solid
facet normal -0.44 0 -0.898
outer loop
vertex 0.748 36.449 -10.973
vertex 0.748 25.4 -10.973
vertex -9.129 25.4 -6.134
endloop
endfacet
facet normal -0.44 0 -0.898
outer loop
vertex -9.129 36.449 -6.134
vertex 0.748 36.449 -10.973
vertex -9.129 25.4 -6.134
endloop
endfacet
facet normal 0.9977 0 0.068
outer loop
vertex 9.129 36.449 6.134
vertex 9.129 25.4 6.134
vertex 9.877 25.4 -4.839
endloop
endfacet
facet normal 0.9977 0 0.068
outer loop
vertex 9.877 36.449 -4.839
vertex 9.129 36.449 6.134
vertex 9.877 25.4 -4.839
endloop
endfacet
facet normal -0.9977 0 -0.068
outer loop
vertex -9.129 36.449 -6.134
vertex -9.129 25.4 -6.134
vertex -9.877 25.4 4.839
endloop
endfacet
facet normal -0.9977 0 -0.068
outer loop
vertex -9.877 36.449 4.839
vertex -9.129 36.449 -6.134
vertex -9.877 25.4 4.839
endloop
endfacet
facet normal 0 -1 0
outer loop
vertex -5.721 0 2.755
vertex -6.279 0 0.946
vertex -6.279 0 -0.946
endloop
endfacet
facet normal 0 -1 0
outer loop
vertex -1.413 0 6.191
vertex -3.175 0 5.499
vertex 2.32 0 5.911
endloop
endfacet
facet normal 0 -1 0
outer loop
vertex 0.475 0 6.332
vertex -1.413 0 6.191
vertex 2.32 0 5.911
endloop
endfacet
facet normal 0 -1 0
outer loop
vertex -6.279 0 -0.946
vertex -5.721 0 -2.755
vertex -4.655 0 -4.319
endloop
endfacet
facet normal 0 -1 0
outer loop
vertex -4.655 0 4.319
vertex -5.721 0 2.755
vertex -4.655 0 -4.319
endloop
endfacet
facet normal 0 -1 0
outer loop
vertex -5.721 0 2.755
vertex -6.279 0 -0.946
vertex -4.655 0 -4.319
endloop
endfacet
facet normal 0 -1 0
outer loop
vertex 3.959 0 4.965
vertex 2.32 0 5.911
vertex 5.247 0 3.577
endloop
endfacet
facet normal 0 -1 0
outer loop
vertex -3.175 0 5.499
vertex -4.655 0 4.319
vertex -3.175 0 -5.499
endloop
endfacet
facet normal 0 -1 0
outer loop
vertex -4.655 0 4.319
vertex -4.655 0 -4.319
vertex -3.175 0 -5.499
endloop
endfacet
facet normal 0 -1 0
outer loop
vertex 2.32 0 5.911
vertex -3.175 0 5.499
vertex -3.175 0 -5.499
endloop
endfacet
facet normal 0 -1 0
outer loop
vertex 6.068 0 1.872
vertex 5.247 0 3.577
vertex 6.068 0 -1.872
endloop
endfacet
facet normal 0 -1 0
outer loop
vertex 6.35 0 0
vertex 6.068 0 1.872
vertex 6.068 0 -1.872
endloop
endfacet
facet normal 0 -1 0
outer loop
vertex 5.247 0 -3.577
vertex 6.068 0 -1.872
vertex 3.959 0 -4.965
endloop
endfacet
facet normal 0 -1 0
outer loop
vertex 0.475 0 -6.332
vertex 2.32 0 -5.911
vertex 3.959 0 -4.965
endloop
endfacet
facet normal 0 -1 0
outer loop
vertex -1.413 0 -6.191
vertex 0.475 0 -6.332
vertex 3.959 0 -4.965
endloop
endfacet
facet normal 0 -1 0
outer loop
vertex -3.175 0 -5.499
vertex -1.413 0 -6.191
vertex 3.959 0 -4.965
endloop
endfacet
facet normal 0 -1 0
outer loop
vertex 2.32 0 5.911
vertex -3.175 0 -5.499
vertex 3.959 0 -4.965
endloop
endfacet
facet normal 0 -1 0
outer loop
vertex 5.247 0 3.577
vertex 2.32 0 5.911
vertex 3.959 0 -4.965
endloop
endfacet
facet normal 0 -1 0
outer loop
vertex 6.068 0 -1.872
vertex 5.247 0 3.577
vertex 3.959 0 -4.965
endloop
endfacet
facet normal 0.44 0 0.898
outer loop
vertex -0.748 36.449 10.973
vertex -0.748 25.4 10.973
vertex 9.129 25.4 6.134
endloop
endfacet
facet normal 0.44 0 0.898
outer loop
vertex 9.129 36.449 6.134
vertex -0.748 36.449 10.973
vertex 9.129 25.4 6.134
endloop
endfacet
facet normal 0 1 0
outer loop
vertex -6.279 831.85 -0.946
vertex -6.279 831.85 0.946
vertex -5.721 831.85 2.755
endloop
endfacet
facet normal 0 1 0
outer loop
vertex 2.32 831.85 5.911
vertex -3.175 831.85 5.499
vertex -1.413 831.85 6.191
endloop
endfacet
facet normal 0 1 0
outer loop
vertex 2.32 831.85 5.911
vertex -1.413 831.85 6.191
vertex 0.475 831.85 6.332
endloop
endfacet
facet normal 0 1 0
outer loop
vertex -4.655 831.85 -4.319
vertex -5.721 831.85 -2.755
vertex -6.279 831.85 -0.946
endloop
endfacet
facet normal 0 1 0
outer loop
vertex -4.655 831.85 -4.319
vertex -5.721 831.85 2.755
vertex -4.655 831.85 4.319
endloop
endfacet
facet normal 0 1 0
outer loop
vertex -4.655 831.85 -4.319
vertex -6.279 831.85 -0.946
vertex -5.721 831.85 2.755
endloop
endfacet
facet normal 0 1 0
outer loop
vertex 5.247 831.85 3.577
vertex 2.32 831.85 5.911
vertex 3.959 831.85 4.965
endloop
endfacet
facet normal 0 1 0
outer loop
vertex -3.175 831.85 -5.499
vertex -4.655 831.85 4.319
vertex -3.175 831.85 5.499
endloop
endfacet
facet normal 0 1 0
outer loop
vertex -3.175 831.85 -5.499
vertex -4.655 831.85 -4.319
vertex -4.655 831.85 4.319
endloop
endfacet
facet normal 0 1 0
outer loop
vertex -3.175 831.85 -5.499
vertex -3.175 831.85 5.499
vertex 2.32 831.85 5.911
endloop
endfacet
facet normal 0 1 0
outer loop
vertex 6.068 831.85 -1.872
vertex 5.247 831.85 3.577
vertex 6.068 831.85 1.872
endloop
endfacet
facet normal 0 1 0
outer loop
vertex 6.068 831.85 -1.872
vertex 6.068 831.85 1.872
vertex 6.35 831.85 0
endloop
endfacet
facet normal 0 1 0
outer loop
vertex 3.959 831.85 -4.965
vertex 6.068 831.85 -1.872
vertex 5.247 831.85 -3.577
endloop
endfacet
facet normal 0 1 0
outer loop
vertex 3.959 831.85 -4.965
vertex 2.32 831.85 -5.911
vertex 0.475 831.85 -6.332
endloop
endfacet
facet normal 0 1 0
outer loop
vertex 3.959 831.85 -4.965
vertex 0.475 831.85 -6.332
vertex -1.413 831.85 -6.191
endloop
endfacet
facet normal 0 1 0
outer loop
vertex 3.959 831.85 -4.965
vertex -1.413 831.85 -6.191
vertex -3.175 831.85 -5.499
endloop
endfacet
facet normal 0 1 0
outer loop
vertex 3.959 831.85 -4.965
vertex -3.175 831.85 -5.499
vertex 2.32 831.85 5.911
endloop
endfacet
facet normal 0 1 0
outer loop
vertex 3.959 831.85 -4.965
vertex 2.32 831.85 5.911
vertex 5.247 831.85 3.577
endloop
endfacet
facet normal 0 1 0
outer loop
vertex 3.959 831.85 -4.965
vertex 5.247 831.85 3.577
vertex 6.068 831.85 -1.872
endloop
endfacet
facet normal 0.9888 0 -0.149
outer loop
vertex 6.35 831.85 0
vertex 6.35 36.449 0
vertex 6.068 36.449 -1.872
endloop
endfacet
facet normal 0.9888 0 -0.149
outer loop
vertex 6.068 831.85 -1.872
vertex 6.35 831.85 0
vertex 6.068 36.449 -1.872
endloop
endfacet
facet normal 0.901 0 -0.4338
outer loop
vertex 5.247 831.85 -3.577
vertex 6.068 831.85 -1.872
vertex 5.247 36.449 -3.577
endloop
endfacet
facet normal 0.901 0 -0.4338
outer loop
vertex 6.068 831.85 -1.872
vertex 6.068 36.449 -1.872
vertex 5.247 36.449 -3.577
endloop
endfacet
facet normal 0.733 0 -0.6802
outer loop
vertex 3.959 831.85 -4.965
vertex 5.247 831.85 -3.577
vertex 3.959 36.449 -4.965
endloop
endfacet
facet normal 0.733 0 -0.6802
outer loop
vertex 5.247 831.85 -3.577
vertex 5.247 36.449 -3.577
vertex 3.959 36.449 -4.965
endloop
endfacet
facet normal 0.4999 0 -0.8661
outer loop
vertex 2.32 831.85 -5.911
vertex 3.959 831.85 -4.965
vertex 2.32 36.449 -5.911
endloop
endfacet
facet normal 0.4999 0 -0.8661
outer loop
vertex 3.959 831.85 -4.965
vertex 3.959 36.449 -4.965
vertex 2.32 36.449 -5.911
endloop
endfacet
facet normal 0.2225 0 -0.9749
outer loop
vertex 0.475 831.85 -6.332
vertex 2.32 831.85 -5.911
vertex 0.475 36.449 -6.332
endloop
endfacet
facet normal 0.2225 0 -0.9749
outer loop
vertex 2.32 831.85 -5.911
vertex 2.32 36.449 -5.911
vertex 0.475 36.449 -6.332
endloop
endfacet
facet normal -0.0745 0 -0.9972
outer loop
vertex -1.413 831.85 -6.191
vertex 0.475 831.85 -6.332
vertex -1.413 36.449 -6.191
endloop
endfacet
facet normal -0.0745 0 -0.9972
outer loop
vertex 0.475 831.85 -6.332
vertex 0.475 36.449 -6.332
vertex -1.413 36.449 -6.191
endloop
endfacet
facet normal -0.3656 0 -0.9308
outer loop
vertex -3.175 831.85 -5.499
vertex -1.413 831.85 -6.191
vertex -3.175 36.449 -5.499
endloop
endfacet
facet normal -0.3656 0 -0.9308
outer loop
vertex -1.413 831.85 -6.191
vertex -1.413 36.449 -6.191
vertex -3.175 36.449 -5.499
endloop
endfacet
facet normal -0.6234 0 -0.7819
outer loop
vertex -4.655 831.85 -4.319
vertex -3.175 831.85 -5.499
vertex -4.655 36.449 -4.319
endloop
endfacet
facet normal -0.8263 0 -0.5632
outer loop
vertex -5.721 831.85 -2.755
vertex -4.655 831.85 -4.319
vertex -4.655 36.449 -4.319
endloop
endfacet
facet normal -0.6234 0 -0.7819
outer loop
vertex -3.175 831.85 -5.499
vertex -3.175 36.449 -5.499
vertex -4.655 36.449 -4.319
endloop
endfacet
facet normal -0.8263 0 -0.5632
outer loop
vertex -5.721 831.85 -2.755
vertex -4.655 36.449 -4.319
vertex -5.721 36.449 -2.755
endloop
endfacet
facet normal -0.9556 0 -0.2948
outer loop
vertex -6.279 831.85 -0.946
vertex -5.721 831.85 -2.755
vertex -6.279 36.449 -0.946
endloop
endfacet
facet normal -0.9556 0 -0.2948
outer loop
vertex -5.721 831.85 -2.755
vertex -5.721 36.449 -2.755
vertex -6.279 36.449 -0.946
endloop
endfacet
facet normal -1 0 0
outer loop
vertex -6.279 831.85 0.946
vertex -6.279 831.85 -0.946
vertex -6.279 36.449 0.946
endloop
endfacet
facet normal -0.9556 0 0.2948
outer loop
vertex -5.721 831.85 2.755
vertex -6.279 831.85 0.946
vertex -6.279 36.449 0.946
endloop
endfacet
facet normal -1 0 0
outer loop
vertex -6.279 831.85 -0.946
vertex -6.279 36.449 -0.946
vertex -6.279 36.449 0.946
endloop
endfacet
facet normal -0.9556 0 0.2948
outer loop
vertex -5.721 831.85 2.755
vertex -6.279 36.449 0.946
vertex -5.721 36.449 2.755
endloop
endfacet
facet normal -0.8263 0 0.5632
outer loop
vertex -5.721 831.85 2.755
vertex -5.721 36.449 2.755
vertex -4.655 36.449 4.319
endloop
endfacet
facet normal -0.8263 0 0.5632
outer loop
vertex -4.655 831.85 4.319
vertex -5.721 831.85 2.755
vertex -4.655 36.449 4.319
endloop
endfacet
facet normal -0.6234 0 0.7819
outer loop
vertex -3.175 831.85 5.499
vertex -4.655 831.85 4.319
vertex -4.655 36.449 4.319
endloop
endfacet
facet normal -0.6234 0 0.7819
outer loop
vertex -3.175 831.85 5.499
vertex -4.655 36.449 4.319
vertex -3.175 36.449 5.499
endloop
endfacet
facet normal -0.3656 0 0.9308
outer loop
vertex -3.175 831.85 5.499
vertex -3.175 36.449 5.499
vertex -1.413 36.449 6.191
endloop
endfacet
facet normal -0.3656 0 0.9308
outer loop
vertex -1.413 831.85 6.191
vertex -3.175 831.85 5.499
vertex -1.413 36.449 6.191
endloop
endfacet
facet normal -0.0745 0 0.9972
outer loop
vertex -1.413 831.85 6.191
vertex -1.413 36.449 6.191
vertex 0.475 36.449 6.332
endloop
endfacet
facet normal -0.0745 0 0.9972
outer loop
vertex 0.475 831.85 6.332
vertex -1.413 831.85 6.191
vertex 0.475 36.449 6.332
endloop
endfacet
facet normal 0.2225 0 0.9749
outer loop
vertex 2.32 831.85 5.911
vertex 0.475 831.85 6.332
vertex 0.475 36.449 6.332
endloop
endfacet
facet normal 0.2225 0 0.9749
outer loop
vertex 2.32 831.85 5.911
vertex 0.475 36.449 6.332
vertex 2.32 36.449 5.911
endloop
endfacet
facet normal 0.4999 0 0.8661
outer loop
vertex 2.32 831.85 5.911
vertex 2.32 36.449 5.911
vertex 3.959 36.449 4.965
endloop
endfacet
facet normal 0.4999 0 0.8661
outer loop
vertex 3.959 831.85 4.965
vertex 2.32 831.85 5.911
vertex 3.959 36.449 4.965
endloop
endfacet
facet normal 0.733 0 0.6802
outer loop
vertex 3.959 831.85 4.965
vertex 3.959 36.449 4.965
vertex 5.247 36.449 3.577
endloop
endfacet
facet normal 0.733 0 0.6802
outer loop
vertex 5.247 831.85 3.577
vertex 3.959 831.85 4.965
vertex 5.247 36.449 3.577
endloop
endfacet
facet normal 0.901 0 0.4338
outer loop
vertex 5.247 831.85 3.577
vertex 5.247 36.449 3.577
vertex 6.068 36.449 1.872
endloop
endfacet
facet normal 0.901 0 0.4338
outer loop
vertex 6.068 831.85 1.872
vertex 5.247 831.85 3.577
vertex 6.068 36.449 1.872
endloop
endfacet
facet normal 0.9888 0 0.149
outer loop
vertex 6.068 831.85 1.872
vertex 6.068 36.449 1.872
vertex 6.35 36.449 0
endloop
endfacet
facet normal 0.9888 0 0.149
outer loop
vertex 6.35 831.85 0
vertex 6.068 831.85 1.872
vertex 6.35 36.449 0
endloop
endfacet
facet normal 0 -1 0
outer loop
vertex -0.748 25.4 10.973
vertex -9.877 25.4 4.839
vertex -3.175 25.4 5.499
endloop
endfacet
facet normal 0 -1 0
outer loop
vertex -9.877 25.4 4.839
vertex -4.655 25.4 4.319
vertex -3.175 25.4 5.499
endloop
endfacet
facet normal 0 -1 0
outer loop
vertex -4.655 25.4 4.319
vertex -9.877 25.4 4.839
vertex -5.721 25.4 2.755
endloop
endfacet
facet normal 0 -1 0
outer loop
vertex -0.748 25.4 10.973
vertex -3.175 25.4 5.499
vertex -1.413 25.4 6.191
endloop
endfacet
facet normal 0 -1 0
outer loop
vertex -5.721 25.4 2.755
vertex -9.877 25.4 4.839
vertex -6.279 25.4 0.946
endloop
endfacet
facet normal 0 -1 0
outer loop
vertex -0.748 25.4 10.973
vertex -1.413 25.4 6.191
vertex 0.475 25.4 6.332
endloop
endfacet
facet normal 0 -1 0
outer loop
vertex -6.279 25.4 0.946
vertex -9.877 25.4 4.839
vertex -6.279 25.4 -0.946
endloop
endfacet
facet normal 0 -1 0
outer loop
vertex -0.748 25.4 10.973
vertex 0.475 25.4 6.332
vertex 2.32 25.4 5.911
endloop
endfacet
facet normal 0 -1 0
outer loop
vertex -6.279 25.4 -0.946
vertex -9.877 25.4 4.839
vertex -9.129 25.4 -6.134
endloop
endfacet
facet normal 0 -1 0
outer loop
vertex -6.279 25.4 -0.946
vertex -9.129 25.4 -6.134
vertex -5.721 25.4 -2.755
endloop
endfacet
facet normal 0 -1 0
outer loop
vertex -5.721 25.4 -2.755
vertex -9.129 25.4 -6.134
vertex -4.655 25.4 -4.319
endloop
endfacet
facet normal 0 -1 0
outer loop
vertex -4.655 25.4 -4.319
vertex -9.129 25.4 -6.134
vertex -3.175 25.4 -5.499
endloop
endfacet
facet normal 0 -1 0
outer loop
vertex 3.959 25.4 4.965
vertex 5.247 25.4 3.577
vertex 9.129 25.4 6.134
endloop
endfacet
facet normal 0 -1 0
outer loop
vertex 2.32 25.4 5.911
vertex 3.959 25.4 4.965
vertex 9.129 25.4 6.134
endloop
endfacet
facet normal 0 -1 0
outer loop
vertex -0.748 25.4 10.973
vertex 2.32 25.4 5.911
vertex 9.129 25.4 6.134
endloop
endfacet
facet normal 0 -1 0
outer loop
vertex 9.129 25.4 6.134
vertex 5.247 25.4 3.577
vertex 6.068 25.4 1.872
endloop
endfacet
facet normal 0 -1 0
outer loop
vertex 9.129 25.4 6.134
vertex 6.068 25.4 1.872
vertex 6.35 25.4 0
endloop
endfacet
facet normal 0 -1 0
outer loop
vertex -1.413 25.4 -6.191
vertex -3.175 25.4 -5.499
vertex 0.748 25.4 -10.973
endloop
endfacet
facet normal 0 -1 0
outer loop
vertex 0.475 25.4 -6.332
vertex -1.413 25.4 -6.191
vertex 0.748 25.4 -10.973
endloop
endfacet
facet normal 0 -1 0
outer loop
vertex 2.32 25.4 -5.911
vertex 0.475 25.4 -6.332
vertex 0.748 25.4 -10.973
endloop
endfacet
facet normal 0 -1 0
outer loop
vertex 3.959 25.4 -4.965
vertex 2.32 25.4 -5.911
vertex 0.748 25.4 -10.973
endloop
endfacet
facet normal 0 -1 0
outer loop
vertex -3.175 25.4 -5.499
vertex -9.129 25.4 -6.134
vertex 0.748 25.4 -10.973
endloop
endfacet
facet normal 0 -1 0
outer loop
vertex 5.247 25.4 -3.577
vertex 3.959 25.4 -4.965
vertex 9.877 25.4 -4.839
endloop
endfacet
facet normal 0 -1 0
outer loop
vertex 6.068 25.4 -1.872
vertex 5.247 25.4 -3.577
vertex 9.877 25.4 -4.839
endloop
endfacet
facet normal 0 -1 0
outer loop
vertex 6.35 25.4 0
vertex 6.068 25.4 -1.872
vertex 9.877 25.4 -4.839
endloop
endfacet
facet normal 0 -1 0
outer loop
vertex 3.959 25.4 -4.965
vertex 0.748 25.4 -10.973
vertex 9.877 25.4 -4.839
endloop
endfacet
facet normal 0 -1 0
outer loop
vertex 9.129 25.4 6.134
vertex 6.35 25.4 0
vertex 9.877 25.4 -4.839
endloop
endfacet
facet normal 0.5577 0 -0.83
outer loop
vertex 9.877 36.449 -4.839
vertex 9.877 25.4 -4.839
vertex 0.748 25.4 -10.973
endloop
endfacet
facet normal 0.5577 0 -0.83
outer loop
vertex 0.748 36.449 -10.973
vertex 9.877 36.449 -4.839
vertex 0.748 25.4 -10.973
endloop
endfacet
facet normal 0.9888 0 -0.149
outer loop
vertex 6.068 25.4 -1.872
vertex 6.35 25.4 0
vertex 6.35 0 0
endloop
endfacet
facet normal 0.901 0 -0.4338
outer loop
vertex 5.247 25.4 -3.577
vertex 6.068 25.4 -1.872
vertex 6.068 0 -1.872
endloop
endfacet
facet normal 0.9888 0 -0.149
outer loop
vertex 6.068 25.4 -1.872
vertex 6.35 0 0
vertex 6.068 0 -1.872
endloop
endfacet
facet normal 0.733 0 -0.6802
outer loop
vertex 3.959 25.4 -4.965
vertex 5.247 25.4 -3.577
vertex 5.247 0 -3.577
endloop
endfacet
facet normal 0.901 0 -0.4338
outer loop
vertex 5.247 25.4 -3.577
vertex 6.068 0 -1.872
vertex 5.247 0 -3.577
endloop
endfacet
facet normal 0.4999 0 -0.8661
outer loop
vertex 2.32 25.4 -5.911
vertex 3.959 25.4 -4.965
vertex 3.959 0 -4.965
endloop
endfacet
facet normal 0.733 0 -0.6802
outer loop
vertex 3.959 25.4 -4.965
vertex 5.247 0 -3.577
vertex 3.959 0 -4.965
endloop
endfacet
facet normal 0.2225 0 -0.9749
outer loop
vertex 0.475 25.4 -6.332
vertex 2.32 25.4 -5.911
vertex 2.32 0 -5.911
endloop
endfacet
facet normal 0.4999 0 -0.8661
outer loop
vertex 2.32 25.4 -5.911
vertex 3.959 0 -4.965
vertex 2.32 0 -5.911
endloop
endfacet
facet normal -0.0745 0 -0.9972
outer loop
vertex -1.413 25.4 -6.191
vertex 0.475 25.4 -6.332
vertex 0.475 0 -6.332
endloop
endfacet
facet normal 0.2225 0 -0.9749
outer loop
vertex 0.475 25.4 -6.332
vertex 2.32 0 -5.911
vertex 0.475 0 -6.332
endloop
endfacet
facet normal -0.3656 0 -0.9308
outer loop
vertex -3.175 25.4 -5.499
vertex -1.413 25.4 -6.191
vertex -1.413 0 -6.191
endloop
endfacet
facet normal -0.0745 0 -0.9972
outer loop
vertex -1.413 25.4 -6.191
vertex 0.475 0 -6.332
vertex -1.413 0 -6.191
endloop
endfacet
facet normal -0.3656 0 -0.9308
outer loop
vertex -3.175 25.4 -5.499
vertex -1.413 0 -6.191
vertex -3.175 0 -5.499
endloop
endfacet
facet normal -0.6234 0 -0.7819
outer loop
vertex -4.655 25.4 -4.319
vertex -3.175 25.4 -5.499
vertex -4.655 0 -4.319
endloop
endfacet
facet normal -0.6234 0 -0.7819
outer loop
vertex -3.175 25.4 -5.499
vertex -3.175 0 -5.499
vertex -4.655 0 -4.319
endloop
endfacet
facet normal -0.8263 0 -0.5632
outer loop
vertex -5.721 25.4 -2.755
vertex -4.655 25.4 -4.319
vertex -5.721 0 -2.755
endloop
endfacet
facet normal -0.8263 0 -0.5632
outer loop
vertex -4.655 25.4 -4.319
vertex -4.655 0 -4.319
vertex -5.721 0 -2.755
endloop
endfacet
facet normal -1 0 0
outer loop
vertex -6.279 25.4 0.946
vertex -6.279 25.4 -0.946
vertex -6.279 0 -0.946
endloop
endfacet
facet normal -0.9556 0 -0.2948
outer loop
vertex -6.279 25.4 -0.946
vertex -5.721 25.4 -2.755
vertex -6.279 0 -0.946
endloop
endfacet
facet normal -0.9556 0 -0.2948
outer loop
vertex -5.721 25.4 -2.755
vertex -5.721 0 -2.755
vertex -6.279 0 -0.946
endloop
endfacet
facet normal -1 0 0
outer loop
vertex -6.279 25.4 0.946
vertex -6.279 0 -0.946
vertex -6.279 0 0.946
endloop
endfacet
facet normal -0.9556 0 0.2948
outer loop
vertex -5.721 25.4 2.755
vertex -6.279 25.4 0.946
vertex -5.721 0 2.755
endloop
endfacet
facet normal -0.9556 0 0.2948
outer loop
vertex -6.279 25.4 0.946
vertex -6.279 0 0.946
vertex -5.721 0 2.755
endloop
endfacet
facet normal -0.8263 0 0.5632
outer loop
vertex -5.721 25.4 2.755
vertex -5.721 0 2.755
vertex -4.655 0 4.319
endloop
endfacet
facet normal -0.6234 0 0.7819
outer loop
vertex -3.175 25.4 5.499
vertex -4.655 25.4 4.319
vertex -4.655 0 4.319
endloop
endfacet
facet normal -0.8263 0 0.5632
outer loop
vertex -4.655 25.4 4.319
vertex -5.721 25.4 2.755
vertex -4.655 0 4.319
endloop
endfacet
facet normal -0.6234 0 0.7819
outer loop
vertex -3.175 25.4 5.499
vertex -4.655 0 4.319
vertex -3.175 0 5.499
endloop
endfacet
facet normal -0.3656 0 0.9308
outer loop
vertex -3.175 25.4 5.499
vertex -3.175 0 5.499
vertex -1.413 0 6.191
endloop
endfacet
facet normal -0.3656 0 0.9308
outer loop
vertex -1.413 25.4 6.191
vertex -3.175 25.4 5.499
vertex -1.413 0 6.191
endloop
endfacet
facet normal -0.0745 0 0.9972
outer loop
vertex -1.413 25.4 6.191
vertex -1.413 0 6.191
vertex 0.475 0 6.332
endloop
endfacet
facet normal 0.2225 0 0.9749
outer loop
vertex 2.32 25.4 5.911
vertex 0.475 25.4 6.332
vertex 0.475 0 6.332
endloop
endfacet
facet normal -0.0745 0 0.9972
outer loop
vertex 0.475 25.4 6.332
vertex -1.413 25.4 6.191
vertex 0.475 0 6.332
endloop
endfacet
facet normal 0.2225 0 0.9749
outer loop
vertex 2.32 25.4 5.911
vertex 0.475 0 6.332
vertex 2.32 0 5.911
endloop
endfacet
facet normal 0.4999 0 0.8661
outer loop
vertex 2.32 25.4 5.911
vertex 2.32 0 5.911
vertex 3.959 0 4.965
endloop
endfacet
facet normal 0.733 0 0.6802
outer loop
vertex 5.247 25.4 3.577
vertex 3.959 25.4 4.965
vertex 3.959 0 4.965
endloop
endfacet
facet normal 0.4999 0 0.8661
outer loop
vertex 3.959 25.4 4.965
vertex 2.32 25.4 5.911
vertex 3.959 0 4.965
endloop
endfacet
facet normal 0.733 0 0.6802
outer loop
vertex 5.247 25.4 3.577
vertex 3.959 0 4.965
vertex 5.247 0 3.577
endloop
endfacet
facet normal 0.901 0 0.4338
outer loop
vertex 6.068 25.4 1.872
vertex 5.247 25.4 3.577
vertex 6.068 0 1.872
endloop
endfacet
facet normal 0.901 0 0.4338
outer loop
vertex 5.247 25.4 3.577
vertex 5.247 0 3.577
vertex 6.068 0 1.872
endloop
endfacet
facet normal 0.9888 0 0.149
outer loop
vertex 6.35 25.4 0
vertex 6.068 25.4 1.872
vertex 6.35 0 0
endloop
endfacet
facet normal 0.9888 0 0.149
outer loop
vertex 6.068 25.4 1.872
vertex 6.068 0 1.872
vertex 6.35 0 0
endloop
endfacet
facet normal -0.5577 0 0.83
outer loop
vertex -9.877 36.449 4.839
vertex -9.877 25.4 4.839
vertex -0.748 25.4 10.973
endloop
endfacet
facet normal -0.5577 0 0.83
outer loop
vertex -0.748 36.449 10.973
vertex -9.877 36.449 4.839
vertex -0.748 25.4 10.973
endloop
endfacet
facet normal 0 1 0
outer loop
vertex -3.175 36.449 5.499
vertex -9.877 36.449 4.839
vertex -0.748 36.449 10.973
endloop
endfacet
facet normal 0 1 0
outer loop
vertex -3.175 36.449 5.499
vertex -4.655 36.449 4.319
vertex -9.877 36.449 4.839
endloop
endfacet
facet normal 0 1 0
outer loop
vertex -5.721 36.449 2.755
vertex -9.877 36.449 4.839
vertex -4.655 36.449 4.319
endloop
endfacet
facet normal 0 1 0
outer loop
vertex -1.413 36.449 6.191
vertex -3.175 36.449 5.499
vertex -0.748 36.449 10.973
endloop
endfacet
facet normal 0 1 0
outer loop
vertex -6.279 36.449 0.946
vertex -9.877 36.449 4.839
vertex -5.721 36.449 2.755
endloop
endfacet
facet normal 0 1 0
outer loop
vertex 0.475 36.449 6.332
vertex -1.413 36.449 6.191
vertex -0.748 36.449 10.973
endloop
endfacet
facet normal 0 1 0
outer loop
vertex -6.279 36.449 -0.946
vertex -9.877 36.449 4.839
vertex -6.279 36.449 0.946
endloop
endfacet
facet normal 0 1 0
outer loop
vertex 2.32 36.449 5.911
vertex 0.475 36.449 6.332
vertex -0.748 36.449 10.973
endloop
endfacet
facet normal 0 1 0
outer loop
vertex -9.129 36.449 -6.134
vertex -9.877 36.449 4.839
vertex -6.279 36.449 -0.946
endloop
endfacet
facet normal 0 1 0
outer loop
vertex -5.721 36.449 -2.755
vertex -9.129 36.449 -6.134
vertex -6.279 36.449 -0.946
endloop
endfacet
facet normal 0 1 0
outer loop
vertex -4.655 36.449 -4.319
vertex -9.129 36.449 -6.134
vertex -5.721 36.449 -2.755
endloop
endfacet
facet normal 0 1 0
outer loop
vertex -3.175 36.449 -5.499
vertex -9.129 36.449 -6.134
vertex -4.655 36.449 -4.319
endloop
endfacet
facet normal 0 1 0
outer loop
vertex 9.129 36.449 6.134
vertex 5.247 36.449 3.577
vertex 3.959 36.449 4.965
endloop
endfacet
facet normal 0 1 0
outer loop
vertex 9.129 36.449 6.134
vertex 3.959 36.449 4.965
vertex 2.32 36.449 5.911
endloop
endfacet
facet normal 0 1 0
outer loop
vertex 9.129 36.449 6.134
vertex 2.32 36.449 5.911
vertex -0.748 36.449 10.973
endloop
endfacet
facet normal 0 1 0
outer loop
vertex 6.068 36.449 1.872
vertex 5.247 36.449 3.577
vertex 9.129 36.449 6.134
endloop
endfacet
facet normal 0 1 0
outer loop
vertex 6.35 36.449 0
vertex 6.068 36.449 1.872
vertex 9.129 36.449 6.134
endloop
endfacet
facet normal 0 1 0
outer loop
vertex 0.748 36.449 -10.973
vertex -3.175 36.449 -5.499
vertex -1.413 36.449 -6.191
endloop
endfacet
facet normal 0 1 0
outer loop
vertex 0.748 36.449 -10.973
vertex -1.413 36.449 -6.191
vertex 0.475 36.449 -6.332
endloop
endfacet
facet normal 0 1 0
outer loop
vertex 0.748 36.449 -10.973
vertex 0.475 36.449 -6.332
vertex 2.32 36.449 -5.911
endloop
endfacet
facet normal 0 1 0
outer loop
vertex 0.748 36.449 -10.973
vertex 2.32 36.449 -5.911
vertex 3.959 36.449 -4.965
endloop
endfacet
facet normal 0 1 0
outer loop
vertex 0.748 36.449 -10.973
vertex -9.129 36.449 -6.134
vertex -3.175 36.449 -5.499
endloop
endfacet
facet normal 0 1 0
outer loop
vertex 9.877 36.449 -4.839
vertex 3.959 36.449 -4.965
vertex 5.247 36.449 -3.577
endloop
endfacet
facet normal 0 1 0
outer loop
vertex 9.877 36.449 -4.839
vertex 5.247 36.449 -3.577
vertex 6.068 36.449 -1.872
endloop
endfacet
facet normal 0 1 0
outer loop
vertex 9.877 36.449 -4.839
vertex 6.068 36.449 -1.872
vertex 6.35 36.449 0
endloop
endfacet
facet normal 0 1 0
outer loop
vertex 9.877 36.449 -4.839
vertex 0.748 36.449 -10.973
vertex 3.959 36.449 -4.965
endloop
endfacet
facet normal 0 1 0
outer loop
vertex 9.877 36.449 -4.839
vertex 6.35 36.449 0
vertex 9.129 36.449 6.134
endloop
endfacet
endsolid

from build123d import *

# Parameters (mm, degrees)
SKETCH1_R           = 6.35
BOSS_EXTRUDE1_DEPTH = 831.85
BOSS_EXTRUDE2_START = 25.4
BOSS_EXTRUDE2_DEPTH = 11.049


with BuildPart() as part:
    # Sketch1 → Boss-Extrude1 (new body)
    with BuildSketch(Plane(origin=(0, 0, 0), x_dir=(1, 0, 0), z_dir=(0, 1, 0))):
        Circle(SKETCH1_R)
    extrude(amount=BOSS_EXTRUDE1_DEPTH)

    # Sketch3 → Boss-Extrude2 (add)
    with BuildSketch(Plane(origin=(0, 0, 0), x_dir=(1, 0, 0), z_dir=(0, 1, 0)).offset(BOSS_EXTRUDE2_START)):
        Polygon((9.876865428, 4.838907863), (0.747815578, 10.973070302), (-9.129049851, 6.134162439), (-9.876865428, -4.838907863), (-0.747815578, -10.973070302), (9.129049851, -6.134162439), align=None)
    extrude(amount=BOSS_EXTRUDE2_DEPTH)


solid = part.part
